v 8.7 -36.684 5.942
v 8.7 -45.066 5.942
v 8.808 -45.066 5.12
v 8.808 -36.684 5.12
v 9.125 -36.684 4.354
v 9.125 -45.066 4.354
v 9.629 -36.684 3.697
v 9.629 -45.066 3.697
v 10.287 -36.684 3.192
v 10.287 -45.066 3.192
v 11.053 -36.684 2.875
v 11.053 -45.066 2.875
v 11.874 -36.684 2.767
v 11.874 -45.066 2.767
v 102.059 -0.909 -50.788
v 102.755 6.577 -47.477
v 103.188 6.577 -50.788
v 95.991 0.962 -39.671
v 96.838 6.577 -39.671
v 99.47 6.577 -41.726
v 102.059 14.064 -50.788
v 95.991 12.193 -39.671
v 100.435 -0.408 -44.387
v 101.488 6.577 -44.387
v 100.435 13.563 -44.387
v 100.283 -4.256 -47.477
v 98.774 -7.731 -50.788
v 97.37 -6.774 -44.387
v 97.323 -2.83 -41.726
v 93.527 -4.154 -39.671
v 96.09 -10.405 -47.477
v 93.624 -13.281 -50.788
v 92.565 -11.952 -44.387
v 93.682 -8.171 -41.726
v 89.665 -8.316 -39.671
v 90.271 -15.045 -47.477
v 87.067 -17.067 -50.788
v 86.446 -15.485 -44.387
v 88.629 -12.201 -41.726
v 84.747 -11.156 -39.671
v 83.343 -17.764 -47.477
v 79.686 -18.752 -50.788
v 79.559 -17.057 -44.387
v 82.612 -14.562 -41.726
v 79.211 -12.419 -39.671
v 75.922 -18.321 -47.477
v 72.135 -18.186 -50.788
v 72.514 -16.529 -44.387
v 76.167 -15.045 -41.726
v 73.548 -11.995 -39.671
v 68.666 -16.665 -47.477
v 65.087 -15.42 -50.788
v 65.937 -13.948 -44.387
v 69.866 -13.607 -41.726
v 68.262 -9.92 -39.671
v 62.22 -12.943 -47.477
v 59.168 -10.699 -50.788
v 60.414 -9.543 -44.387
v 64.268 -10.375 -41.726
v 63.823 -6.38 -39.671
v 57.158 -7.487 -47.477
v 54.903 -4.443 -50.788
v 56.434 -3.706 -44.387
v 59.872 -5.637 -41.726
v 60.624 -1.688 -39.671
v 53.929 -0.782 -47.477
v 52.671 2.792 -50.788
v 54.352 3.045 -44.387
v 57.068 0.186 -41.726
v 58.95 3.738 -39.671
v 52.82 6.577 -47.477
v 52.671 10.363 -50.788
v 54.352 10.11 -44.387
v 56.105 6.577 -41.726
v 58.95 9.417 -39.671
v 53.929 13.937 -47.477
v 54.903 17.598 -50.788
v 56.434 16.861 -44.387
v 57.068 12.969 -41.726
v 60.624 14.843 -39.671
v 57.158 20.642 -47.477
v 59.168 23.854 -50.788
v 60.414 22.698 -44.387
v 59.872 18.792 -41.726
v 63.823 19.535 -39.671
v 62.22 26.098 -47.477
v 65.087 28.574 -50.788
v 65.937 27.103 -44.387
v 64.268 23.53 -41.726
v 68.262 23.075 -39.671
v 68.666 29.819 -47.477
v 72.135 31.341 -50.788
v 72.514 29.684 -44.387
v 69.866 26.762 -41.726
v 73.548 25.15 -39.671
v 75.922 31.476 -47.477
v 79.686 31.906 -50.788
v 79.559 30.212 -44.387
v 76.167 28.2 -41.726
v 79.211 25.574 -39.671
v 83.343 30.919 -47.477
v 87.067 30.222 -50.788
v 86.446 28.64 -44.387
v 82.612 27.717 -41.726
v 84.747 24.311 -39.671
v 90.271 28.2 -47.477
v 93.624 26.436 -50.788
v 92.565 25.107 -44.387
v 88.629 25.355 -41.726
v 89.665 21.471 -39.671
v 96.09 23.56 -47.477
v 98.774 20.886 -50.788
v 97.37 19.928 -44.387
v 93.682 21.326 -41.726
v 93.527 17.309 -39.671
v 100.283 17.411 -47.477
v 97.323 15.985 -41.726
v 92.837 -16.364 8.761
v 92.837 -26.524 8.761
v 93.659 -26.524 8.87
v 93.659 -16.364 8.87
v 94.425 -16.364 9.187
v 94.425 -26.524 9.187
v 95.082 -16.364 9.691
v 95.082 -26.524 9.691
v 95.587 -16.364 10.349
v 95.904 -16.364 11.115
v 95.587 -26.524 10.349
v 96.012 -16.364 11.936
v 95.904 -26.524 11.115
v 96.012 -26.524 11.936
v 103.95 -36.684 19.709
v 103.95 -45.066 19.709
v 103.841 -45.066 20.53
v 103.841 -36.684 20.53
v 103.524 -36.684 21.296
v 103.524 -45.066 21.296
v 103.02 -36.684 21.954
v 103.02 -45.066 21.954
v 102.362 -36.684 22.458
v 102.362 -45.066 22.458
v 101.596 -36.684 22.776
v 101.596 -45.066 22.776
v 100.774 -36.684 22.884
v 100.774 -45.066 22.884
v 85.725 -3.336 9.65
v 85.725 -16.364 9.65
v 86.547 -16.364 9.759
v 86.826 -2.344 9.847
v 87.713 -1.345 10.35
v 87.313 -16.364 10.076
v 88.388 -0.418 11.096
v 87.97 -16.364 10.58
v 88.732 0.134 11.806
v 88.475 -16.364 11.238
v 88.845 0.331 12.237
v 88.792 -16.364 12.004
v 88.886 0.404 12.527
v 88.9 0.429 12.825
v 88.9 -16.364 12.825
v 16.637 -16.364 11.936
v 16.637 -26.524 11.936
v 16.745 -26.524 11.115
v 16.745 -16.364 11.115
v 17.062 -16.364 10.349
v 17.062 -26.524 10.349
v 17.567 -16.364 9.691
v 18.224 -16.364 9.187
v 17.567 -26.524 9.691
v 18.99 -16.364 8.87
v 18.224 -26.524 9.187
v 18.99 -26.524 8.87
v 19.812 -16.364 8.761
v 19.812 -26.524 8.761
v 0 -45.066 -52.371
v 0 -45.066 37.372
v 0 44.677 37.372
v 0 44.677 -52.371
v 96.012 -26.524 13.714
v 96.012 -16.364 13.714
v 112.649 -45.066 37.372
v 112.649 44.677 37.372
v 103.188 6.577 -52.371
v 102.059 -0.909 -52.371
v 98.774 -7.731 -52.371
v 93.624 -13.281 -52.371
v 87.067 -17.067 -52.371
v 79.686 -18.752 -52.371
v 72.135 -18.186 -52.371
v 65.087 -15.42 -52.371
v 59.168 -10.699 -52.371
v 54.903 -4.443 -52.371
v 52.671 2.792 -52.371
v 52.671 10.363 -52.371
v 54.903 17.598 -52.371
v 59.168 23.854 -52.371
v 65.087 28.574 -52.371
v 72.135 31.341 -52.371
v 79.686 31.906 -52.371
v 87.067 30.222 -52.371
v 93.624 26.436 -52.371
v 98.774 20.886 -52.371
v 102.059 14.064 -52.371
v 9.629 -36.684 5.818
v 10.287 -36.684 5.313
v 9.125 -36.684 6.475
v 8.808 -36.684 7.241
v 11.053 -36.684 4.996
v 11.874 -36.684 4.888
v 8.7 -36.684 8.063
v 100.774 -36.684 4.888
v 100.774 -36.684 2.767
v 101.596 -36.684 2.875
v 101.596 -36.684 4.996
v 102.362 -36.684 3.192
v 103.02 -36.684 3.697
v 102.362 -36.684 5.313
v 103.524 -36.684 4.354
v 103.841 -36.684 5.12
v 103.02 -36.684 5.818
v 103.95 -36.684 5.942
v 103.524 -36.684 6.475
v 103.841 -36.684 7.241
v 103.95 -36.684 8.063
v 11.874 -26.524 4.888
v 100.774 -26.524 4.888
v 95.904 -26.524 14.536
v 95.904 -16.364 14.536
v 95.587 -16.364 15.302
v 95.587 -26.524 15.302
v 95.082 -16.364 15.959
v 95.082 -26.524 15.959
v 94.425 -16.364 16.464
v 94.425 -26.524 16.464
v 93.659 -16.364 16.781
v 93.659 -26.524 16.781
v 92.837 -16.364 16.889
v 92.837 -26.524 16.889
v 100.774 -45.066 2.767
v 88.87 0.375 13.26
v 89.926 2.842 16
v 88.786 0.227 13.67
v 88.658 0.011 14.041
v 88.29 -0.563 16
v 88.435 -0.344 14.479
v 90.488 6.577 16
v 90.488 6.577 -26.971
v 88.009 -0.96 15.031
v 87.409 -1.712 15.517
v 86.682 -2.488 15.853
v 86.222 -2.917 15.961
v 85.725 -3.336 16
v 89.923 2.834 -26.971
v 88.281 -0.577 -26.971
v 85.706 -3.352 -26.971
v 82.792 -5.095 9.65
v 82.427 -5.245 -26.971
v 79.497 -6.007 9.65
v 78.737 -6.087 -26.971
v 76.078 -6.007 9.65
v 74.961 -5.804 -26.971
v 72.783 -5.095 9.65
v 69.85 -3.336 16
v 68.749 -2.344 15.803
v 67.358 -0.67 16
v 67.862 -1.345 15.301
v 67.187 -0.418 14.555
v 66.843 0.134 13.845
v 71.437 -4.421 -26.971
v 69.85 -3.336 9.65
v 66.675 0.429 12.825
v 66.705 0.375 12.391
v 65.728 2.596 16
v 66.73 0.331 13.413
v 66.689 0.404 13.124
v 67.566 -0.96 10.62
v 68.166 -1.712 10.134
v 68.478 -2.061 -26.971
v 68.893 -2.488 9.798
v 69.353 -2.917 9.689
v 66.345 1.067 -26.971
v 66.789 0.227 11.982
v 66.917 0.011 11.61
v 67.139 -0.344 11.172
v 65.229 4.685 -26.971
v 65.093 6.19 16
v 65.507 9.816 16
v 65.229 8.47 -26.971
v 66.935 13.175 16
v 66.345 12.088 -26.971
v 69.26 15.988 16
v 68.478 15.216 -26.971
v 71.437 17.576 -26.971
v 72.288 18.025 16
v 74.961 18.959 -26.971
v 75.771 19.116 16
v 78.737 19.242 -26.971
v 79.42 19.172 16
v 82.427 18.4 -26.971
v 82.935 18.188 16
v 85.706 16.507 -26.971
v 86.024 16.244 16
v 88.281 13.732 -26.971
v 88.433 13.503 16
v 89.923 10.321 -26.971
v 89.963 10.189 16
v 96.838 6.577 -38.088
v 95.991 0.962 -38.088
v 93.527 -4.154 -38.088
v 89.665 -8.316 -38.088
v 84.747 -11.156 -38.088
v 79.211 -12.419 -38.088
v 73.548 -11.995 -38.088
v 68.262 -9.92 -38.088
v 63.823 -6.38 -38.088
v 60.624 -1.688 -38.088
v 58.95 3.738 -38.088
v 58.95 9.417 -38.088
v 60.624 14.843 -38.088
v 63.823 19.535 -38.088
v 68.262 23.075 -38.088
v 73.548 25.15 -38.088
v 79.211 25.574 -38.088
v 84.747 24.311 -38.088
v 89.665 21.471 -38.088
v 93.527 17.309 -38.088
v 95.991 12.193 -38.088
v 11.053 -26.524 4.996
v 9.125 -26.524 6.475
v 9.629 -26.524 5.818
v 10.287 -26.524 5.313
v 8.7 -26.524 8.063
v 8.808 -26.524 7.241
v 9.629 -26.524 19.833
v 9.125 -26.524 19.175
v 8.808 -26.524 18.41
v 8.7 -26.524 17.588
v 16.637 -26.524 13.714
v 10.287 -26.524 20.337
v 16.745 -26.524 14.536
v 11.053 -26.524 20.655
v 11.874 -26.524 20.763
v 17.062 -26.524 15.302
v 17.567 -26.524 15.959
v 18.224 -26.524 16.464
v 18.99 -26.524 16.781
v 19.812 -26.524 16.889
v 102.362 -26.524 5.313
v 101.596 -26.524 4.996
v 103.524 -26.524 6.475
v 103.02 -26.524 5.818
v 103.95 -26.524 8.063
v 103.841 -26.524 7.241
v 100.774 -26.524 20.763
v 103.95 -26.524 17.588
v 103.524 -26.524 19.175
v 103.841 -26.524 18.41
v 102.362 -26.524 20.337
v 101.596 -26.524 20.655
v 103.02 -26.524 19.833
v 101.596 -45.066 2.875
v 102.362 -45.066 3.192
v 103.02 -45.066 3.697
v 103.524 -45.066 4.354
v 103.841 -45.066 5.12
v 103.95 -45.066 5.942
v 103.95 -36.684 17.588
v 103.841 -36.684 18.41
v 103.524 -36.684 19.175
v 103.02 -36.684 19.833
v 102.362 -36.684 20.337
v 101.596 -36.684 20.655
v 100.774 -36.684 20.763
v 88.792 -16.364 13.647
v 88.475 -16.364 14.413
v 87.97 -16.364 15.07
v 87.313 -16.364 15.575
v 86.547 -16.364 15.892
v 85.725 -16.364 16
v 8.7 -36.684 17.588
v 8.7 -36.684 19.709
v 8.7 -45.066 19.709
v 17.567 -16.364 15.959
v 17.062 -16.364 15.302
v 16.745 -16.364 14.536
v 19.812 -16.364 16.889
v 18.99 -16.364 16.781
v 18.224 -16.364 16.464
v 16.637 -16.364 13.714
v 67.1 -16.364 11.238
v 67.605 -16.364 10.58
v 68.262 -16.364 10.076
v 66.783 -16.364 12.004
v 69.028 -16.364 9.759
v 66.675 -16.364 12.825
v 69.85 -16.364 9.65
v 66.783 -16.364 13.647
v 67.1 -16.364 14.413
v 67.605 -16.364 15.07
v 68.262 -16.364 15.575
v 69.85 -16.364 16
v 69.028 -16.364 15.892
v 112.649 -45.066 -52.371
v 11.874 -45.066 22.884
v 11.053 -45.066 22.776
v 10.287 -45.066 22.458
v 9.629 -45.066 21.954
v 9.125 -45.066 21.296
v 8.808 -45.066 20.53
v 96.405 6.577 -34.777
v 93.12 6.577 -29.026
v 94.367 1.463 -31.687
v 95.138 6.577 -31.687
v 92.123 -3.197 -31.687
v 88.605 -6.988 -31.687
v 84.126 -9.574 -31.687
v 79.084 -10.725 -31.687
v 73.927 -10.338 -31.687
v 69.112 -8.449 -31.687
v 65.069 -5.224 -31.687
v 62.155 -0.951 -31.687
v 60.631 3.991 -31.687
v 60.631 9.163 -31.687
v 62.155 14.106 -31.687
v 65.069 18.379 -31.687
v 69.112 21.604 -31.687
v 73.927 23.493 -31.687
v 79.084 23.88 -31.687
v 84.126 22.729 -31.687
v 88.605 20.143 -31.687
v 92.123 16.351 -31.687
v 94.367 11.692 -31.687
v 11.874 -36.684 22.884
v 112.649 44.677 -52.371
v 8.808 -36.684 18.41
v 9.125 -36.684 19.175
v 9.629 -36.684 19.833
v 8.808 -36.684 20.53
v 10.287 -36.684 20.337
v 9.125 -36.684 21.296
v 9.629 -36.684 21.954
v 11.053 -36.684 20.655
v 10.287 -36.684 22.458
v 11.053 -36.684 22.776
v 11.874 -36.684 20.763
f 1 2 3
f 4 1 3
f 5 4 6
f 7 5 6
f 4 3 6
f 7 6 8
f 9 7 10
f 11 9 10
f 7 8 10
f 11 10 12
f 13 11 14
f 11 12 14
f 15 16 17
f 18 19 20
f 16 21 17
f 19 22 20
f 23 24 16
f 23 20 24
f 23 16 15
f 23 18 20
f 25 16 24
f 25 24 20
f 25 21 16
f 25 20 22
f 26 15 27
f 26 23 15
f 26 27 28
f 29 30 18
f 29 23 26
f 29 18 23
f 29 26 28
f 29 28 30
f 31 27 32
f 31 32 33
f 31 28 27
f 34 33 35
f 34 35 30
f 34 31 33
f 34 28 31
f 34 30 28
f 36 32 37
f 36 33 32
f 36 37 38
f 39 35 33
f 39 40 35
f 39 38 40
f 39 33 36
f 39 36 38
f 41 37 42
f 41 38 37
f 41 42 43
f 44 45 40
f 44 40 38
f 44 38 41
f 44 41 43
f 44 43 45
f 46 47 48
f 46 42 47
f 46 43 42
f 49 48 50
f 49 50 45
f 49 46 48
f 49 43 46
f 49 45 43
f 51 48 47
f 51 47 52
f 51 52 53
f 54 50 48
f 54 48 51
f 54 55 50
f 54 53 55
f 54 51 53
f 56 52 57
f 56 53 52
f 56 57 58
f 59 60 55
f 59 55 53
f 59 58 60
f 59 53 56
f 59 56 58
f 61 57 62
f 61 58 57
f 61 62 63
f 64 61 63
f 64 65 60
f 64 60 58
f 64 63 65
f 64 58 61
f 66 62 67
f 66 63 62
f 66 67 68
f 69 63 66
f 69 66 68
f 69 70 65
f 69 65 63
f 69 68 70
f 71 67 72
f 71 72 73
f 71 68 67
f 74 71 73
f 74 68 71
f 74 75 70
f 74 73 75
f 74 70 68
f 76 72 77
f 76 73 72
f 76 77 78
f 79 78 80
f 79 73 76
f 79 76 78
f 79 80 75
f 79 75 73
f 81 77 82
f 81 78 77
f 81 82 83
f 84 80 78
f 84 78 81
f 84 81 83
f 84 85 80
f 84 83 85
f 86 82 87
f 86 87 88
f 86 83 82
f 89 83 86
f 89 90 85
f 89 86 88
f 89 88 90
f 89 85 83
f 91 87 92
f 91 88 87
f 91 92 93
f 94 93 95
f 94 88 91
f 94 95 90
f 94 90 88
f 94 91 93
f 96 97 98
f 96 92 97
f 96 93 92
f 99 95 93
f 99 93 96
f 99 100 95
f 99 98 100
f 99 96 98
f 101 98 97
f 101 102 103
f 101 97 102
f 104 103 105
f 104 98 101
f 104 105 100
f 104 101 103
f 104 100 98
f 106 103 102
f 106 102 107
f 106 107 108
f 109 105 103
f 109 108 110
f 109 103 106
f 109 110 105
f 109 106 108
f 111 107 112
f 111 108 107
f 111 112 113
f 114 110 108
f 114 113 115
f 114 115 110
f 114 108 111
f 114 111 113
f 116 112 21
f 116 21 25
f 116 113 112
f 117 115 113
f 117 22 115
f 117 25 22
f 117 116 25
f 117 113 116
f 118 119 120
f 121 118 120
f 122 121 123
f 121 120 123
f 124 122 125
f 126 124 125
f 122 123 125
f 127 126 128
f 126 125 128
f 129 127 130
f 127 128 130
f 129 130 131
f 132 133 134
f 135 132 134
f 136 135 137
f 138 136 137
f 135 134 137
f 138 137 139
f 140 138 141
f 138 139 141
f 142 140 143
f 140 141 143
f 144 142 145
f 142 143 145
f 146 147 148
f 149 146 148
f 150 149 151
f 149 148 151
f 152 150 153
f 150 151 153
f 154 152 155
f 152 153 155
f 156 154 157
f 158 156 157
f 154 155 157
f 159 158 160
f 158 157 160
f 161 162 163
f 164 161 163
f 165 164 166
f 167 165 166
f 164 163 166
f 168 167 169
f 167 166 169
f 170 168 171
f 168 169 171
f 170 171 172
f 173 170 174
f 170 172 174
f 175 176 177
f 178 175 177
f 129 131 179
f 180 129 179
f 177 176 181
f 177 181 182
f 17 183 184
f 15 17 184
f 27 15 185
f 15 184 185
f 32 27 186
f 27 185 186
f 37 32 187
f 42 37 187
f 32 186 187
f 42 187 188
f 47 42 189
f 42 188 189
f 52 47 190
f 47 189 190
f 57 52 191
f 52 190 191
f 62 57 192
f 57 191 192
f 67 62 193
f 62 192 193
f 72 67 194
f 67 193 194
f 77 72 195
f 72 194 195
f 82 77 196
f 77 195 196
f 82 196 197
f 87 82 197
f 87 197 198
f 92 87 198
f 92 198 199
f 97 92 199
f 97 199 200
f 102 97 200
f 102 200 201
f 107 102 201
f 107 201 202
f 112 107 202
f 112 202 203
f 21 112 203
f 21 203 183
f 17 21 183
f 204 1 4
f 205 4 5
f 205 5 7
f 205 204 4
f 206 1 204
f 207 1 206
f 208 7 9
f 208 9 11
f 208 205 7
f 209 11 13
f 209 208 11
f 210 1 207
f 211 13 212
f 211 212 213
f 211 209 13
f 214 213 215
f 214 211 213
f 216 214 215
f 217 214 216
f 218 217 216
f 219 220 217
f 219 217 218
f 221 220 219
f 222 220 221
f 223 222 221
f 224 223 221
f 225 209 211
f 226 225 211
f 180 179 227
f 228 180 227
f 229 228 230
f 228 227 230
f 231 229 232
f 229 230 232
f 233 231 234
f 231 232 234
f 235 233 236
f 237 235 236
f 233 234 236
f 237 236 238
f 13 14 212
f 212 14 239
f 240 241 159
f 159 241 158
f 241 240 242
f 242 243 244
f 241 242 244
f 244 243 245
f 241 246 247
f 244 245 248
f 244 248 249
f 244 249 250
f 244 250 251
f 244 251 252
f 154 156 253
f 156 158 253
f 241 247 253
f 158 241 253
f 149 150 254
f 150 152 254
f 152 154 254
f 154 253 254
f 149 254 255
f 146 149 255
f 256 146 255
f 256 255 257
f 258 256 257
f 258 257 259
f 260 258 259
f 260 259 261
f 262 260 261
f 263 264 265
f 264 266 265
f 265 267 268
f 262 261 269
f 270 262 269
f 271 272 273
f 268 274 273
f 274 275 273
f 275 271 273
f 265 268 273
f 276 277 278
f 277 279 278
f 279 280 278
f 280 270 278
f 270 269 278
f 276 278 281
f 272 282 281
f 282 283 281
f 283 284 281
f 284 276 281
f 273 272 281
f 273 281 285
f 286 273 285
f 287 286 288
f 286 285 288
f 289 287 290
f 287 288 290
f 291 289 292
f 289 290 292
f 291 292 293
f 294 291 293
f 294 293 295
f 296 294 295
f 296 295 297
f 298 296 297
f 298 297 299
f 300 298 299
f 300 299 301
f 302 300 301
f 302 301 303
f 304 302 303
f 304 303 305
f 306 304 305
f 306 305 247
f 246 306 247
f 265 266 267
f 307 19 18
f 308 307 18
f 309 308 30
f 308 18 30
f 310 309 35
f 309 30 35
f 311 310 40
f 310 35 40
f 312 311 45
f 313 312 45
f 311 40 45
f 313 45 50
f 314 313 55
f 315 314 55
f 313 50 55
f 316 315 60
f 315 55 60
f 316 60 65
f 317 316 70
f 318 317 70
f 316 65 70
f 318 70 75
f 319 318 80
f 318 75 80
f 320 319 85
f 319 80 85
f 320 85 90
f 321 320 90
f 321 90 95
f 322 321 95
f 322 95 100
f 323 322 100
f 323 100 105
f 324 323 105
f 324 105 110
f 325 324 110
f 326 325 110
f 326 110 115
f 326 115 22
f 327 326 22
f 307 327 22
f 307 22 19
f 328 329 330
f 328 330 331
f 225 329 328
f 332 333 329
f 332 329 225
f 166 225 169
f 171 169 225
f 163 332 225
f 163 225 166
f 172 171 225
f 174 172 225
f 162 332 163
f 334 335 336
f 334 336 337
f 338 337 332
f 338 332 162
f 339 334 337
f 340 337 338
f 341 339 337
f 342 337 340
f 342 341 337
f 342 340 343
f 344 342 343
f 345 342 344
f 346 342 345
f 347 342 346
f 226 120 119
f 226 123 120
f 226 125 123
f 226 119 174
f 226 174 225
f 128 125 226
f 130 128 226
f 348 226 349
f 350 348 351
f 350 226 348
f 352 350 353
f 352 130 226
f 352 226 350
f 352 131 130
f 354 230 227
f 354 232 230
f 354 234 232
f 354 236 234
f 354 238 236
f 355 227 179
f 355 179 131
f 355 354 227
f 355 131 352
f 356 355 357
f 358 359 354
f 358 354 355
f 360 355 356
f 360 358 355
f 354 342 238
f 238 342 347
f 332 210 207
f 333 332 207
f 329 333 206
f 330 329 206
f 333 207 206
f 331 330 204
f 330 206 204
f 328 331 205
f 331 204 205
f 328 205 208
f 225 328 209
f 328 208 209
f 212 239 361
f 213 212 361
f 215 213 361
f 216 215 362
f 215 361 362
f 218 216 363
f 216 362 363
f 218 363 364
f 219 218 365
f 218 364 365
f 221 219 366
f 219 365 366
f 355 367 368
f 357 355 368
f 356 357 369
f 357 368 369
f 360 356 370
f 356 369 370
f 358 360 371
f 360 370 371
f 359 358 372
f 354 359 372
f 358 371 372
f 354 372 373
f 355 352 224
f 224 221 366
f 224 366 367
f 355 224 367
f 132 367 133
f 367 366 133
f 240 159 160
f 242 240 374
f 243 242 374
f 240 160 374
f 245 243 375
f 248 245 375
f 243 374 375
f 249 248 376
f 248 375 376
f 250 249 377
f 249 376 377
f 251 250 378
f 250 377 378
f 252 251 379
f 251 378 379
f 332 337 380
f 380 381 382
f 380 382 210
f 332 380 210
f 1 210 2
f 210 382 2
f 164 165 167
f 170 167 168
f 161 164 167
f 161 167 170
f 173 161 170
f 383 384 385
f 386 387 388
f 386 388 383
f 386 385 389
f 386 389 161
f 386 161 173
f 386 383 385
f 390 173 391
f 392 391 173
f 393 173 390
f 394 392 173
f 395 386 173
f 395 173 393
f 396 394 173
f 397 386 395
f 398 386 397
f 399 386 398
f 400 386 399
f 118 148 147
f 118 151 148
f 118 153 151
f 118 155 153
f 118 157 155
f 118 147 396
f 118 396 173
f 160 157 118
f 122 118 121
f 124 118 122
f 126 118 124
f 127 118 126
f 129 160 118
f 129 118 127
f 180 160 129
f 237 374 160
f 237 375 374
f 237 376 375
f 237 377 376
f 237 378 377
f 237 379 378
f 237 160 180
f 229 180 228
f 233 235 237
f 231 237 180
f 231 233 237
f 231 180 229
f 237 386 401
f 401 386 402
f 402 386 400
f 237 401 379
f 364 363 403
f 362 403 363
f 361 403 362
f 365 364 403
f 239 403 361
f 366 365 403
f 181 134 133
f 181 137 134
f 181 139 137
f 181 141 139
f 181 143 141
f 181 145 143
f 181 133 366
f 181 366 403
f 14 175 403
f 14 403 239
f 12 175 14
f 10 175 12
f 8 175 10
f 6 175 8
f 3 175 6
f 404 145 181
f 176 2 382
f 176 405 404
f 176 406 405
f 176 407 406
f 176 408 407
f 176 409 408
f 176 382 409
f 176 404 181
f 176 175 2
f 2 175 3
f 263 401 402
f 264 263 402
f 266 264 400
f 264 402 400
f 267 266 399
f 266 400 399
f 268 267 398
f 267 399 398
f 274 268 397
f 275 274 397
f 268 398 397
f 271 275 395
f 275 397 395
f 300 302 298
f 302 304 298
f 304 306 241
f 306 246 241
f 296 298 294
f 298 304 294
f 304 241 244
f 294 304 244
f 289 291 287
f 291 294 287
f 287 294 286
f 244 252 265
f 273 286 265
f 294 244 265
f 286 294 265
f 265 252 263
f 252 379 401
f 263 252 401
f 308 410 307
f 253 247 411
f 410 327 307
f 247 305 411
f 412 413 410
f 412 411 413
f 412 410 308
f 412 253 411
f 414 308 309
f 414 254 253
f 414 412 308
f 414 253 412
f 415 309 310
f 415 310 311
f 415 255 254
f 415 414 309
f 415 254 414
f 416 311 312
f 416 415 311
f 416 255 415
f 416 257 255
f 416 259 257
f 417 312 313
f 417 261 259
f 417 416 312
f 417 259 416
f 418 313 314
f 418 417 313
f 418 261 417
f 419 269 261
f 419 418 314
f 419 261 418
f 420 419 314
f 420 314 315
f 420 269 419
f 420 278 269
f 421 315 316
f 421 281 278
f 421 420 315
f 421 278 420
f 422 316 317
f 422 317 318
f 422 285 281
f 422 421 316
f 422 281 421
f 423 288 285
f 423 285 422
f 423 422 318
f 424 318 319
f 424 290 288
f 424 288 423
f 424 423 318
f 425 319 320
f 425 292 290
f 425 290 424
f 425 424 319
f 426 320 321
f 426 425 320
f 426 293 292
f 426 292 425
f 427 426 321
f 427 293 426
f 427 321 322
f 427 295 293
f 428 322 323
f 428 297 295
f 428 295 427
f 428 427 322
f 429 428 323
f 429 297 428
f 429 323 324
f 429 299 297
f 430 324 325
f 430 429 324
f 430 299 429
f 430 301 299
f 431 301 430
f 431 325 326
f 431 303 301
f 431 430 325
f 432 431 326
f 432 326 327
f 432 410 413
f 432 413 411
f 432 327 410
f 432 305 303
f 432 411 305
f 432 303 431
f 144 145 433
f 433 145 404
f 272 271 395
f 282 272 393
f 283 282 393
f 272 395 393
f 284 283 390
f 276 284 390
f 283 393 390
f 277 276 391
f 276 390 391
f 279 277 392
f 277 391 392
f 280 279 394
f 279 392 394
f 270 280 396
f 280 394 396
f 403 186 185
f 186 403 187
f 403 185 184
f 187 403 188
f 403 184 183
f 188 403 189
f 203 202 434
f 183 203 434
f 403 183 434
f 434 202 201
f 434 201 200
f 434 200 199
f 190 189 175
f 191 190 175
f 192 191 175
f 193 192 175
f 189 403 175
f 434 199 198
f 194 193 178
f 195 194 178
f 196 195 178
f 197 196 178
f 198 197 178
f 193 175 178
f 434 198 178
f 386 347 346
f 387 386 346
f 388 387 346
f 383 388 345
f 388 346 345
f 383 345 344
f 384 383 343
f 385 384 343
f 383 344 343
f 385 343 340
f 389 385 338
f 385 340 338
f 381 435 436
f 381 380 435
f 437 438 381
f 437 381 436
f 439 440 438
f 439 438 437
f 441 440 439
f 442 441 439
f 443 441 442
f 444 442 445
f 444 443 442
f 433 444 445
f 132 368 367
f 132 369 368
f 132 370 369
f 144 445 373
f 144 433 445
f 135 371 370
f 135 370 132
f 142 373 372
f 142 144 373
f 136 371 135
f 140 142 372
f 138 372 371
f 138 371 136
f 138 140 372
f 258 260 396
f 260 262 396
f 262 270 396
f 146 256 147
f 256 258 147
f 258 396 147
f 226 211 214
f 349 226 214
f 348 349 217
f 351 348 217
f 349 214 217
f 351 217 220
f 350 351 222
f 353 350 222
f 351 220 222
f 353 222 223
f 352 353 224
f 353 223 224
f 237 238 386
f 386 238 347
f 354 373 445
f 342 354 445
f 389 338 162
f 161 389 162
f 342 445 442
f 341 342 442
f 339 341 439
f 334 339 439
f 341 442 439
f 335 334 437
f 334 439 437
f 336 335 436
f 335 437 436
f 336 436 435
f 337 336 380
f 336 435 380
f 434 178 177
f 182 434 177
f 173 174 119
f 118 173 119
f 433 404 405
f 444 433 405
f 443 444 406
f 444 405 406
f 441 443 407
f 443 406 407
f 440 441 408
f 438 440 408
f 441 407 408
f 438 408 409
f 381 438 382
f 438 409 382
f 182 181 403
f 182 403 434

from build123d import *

# Parameters (mm, degrees)
F0_W      = 89.74328
F0_H      = 89.74328
F1_DEPTH  = 112.649
F3_DEPTH  = 8.382
F5_DEPTH  = 10.16
F7_DEPTH  = 10.16
F9_DEPTH  = 25.4
F10_R     = 25.4
F11_DEPTH = 12.7
F12_R     = 19.05
F13_DEPTH = 12.7
F14_R     = 12.7
F15_DEPTH = 42.97172


# Not quite as in the source:
# - a fillet or chamfer that OpenCascade refuses, or shapes differently, is made with other operations: its cross-section is extruded or revolved along the edge and cut away or added


with BuildPart() as f1:
    # F0 (on Right) → F1 (new body)
    with BuildSketch(Plane.YZ):
        with Locations((-0.1941993833, -7.4997466138)):
            Rectangle(F0_W, F0_H)
    extrude(amount=F1_DEPTH)

    # F2 (on face) → F3 (cut)
    with BuildSketch(Plane.XZ.offset(45.0658393833)):
        with BuildLine():
            ThreePointArc((103.9495, 19.7087333862), (103.0195640303, 21.9537974165), (100.7745, 22.8837333862))
            Line((100.7745, 22.8837333862), (11.8745, 22.8837333862))
            ThreePointArc((11.8745, 22.8837333862), (9.6294359697, 21.9537974165), (8.6995, 19.7087333862))
            Line((8.6995, 19.7087333862), (8.6995, 5.9419333862))
            ThreePointArc((8.6995, 5.9419333862), (9.6294359697, 3.6968693559), (11.8745, 2.7669333862))
            Line((11.8745, 2.7669333862), (100.7745, 2.7669333862))
            ThreePointArc((100.7745, 2.7669333862), (103.0195640303, 3.6968693559), (103.9495, 5.9419333862))
            Line((103.9495, 5.9419333862), (103.9495, 19.7087333862))
        make_face()
    extrude(amount=-F3_DEPTH, mode=Mode.SUBTRACT)

    # F4 (on face) → F5 (cut)
    with BuildSketch(Plane.XZ.offset(36.6838393833)):
        with BuildLine():
            ThreePointArc((8.6995, 8.0628333862), (9.6294359697, 5.8177693559), (11.8745, 4.8878333862))
            Line((11.8745, 4.8878333862), (100.7745, 4.8878333862))
            ThreePointArc((100.7745, 4.8878333862), (103.0195640303, 5.8177693559), (103.9495, 8.0628333862))
            Line((103.9495, 8.0628333862), (103.9495, 17.5878333862))
            ThreePointArc((103.9495, 17.5878333862), (103.0195640303, 19.8328974165), (100.7745, 20.7628333862))
            Line((100.7745, 20.7628333862), (11.8745, 20.7628333862))
            ThreePointArc((11.8745, 20.7628333862), (9.6294359697, 19.8328974165), (8.6995, 17.5878333862))
            Line((8.6995, 17.5878333862), (8.6995, 8.0628333862))
        make_face()
    extrude(amount=-F5_DEPTH, mode=Mode.SUBTRACT)

    # F6 (on face) → F7 (cut)
    with BuildSketch(Plane.XZ.offset(26.5238393833)):
        with BuildLine():
            ThreePointArc((16.637, 11.9363333862), (17.5669359697, 9.6912693559), (19.812, 8.7613333862))
            Line((19.812, 8.7613333862), (92.837, 8.7613333862))
            ThreePointArc((92.837, 8.7613333862), (95.0820640303, 9.6912693559), (96.012, 11.9363333862))
            Line((96.012, 11.9363333862), (96.012, 13.7143333862))
            ThreePointArc((96.012, 13.7143333862), (95.0820640303, 15.9593974165), (92.837, 16.8893333862))
            Line((92.837, 16.8893333862), (19.812, 16.8893333862))
            ThreePointArc((19.812, 16.8893333862), (17.5669359697, 15.9593974165), (16.637, 13.7143333862))
            Line((16.637, 13.7143333862), (16.637, 11.9363333862))
        make_face()
    extrude(amount=-F7_DEPTH, mode=Mode.SUBTRACT)

    # F8 (on face) → F9 (cut)
    with BuildSketch(Plane.XZ.offset(16.3638393833)):
        with BuildLine():
            ThreePointArc((88.9, 12.8253333862), (87.9700640303, 15.0703974165), (85.725, 16.0003333862))
            Line((85.725, 16.0003333862), (69.85, 16.0003333862))
            ThreePointArc((69.85, 16.0003333862), (67.6049359697, 15.0703974165), (66.675, 12.8253333862))
            ThreePointArc((66.675, 12.8253333862), (67.6049359697, 10.5802693559), (69.85, 9.6503333862))
            Line((69.85, 9.6503333862), (85.725, 9.6503333862))
            ThreePointArc((85.725, 9.6503333862), (87.9700640303, 10.5802693559), (88.9, 12.8253333862))
        make_face()
    extrude(amount=-F9_DEPTH, mode=Mode.SUBTRACT)

    # F10 (on face) → F11 (cut)
    with BuildSketch(Plane(origin=(0, 0, -52.3713866138), x_dir=(1, 0, 0), z_dir=(0, 0, -1))):
        with Locations((77.7875, -6.5774406167)):
            Circle(F10_R)
    extrude(amount=-F11_DEPTH, mode=Mode.SUBTRACT)

    # F12 (on face) → F13 (cut)
    with BuildSketch(Plane(origin=(0, 0, -39.6713866138), x_dir=(1, 0, 0), z_dir=(0, 0, -1))):
        with Locations((77.7875, -6.5774406167)):
            Circle(F12_R)
    extrude(amount=-F13_DEPTH, mode=Mode.SUBTRACT)

    # F14 (on face) → F15 (cut)
    with BuildSketch(Plane(origin=(0, 0, -26.9713866138), x_dir=(1, 0, 0), z_dir=(0, 0, -1))):
        with Locations((77.7875, -6.5774406167)):
            Circle(F14_R)
    extrude(amount=-F15_DEPTH, mode=Mode.SUBTRACT)

    # F16: fillet of radius 12.90574 on 2 edges, made by hand

    # F16_s1 → F16_t2 (revolve)
    with BuildSketch(Plane.XZ.offset(-6.5774406167)):
        with BuildLine():
            ThreePointArc((103.1875, -50.7880586878), (101.4881153597, -44.3868303291), (96.8375, -39.6713866138))
            Line((96.8375, -39.6713866138), (96.9686148, -39.4490531723))
            ThreePointArc((96.9686148, -39.4490531723), (100.0125, -39.4132718138), (103.1875, -39.4132718138))
            Line((103.1875, -39.4132718138), (103.4456148, -39.6713866138))
            Line((103.4456148, -39.6713866138), (103.4456148, -50.7880586878))
            Line((103.4456148, -50.7880586878), (103.1875, -50.7880586878))
        make_face()
    revolve(axis=Axis((77.7875, 6.5774406167, -39.6713866138), (0, 0, -1)))

    # F16_s3 → F16_t4 (revolve)
    with BuildSketch(Plane.XZ.offset(-6.5774406167)):
        with BuildLine():
            ThreePointArc((96.8375, -38.0880586878), (95.1381153597, -31.6868303291), (90.4875, -26.9713866138))
            Line((90.4875, -26.9713866138), (90.6186148, -26.7490531723))
            ThreePointArc((90.6186148, -26.7490531723), (93.6625, -26.7132718138), (96.8375, -26.7132718138))
            Line((96.8375, -26.7132718138), (97.0956148, -26.9713866138))
            Line((97.0956148, -26.9713866138), (97.0956148, -38.0880586878))
            Line((97.0956148, -38.0880586878), (96.8375, -38.0880586878))
        make_face()
    revolve(axis=Axis((77.7875, 6.5774406167, -26.9713866138), (0, 0, -1)))


solid = f1.part
